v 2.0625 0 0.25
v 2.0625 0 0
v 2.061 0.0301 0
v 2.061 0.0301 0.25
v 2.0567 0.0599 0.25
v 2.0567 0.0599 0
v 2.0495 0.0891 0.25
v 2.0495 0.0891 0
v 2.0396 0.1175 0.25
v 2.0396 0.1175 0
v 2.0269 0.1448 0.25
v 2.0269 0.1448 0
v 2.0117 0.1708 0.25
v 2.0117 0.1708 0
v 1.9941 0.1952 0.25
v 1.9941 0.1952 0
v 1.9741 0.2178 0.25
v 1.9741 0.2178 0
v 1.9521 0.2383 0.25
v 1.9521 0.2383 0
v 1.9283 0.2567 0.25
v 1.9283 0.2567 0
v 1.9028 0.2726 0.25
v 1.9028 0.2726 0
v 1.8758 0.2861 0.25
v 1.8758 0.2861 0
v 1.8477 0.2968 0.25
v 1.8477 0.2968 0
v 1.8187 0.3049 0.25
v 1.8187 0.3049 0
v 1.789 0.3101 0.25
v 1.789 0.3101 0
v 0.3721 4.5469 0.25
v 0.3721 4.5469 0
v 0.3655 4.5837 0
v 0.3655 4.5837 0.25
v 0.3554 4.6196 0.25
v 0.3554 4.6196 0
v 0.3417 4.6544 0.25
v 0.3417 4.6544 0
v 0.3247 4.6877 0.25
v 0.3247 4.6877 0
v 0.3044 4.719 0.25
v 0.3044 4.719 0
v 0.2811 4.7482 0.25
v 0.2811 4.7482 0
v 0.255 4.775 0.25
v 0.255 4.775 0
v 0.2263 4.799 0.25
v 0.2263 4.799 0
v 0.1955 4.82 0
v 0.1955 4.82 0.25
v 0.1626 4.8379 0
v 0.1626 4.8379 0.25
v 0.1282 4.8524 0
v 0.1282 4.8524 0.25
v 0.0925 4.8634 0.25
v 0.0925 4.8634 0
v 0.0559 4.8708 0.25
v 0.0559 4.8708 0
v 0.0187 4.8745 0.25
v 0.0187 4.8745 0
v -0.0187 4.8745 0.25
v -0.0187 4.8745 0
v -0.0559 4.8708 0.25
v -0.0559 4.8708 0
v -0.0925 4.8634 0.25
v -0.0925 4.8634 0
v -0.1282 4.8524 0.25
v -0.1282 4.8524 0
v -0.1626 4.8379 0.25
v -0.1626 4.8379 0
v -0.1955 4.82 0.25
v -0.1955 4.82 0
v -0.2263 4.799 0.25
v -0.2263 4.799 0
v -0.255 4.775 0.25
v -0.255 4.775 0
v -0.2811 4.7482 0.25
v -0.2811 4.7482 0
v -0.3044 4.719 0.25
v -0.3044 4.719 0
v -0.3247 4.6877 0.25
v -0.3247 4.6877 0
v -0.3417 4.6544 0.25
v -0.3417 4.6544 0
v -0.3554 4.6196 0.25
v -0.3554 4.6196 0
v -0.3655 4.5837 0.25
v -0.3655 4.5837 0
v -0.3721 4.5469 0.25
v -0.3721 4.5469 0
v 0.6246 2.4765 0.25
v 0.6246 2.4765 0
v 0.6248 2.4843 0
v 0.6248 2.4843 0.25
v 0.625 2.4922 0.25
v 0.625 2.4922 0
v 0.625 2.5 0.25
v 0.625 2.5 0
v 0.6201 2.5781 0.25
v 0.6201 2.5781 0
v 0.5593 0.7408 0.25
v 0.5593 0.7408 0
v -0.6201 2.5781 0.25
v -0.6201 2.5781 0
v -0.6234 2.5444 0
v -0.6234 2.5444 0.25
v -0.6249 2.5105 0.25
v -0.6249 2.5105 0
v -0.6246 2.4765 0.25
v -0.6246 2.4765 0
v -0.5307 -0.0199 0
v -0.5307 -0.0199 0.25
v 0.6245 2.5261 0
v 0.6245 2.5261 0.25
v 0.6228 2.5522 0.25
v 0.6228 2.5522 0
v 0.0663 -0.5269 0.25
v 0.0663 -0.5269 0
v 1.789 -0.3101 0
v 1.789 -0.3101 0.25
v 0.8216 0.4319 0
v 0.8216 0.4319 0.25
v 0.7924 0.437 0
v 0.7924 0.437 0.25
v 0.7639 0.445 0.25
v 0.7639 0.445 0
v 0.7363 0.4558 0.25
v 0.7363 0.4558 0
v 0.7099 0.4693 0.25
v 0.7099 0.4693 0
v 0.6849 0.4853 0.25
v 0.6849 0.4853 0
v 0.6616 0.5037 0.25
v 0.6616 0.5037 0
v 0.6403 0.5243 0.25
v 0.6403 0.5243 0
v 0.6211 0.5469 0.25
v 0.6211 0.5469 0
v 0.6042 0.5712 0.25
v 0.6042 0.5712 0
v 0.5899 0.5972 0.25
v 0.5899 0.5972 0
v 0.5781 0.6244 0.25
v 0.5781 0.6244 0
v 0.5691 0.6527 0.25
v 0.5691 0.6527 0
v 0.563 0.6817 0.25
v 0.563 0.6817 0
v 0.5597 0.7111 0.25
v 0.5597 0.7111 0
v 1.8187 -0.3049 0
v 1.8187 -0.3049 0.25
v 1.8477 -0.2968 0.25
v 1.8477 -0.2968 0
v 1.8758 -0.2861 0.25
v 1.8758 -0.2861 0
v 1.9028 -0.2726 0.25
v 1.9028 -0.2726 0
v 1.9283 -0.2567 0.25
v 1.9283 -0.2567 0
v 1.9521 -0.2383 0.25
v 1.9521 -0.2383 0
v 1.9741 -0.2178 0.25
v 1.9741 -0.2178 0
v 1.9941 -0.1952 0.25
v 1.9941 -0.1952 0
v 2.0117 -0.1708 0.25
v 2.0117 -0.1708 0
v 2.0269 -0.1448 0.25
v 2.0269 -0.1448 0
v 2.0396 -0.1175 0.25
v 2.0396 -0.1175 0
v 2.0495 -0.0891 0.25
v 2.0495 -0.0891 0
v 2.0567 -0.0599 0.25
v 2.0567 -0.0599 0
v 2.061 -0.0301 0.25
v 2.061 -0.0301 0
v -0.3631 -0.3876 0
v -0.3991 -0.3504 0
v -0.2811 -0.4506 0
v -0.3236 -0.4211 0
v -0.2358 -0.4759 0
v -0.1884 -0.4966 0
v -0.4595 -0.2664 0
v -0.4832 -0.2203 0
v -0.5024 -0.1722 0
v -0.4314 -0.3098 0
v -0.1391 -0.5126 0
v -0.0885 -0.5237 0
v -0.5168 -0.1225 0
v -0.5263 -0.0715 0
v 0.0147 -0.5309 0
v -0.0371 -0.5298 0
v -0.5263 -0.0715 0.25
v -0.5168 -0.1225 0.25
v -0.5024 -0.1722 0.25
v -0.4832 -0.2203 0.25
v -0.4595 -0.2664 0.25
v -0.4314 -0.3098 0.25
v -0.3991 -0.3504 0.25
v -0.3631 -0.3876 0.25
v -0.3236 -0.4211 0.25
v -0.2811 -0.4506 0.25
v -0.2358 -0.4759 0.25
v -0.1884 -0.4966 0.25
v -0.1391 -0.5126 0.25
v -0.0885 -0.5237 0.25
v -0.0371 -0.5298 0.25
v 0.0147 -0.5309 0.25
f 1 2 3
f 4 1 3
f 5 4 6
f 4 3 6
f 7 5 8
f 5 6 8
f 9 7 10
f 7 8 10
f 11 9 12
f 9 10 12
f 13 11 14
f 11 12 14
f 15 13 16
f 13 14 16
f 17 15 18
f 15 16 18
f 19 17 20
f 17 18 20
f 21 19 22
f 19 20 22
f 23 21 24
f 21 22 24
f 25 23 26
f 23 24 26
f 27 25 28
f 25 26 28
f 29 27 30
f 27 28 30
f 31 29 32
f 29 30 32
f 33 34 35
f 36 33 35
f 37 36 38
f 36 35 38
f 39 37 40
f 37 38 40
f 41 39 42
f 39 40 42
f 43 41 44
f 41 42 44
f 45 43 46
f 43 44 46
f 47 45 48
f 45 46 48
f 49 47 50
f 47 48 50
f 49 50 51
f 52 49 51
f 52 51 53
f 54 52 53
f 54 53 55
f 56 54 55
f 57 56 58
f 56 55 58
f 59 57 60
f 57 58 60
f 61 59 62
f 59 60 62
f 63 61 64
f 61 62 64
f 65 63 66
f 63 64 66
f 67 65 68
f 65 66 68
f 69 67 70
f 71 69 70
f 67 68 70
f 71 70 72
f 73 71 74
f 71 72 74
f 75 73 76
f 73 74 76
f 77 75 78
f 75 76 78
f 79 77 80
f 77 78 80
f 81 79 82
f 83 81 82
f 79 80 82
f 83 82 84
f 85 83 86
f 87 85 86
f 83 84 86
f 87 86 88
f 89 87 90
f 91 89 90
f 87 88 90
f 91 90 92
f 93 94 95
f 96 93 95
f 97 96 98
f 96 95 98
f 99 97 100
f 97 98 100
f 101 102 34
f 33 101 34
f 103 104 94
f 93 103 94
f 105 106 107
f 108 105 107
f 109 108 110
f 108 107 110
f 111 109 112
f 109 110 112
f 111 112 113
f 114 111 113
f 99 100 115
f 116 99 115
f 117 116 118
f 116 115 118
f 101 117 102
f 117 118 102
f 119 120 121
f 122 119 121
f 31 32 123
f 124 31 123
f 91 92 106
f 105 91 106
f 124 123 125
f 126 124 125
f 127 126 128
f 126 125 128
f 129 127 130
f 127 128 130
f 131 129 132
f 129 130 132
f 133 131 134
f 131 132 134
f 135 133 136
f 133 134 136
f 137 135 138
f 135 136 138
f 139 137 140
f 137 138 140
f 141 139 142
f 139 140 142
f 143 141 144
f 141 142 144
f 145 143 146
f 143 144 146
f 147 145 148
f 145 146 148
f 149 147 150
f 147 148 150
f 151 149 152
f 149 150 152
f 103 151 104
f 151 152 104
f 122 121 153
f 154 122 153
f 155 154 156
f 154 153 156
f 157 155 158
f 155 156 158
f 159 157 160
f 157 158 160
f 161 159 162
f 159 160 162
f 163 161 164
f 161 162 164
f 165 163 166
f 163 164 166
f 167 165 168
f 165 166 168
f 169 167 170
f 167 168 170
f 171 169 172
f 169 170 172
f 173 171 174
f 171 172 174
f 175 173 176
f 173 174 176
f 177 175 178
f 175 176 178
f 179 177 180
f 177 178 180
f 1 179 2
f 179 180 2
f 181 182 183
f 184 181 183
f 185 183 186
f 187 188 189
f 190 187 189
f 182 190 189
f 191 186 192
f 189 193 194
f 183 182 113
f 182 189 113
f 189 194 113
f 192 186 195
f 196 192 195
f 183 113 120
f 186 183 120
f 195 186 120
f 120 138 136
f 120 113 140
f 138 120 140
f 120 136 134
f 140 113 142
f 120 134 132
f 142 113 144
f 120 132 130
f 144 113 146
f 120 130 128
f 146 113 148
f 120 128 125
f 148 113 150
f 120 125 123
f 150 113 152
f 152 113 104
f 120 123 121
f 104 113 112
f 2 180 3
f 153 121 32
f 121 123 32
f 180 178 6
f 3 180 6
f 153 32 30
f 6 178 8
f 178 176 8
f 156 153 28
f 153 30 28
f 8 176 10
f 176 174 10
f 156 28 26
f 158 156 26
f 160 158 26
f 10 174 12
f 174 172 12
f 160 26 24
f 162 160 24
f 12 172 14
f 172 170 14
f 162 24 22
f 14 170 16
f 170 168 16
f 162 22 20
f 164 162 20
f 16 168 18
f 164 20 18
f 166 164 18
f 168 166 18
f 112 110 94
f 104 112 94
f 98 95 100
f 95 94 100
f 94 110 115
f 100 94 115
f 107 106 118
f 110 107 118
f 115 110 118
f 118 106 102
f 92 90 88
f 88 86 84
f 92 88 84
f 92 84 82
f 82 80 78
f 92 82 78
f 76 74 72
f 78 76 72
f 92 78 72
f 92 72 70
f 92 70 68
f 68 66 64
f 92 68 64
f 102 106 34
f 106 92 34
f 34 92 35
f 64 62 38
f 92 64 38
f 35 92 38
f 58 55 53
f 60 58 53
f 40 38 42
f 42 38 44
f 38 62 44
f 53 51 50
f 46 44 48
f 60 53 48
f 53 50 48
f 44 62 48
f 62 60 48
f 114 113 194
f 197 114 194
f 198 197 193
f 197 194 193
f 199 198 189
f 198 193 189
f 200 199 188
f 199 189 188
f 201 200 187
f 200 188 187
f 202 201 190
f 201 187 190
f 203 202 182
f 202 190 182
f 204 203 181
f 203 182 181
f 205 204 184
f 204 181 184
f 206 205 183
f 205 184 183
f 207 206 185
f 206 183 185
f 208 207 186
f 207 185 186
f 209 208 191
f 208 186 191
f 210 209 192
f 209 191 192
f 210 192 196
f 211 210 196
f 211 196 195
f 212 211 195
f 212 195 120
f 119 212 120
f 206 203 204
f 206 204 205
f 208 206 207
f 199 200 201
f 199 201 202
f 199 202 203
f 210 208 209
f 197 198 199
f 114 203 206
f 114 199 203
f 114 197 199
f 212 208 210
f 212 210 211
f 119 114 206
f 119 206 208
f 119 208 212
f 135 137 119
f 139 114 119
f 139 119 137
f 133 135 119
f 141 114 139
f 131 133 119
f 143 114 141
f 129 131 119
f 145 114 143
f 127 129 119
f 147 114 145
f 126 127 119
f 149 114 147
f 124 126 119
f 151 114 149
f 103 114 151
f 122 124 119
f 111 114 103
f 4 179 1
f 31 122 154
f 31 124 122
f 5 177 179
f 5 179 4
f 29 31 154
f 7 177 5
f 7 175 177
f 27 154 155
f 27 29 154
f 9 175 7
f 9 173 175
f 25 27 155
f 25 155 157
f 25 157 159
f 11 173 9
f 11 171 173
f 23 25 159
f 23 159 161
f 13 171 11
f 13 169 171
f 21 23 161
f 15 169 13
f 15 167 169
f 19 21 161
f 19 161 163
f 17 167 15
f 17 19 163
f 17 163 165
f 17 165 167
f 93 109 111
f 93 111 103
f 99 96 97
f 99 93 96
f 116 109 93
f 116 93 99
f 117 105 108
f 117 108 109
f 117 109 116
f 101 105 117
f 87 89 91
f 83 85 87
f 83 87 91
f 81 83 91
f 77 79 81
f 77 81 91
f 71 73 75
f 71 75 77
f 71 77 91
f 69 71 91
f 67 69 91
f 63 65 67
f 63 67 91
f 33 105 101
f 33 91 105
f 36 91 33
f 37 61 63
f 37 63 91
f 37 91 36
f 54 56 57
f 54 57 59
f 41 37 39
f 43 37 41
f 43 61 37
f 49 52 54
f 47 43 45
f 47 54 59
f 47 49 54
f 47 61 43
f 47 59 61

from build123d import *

# Parameters (mm, degrees)
F1_DEPTH = 0.25


with BuildPart() as f1:
    # F0 (on Top) → F1 (new body)
    with BuildSketch(Plane.XY):
        with BuildLine():
            ThreePointArc((0.372059, 4.546875), (0, 4.875), (-0.372059, 4.546875))
            ThreePointArc((-0.372059, 4.546875), (-0.023484, 4.125736), (0.375, 4.5))
            ThreePointArc((0.375, 4.5), (0.374264, 4.523484), (0.372059, 4.546875))
        make_face()
        with BuildLine():
            Line((-0.372059, 4.546875), (-0.620098, 2.578125))
            ThreePointArc((-0.620098, 2.578125), (0, 3.125), (0.620098, 2.578125))
            Line((0.620098, 2.578125), (0.372059, 4.546875))
            ThreePointArc((0.372059, 4.546875), (0.374264, 4.523484), (0.375, 4.5))
            ThreePointArc((0.375, 4.5), (-0.023484, 4.125736), (-0.372059, 4.546875))
        make_face()
        with BuildLine():
            ThreePointArc((-0.620098, 2.578125), (-0.624398, 2.527417), (-0.624559, 2.476526))
            ThreePointArc((-0.624559, 2.476526), (0, 1.875), (0.624559, 2.476526))
            ThreePointArc((0.624559, 2.476526), (0.62489, 2.488261), (0.625, 2.5))
            ThreePointArc((0.625, 2.5), (0.623773, 2.539139), (0.620098, 2.578125))
            ThreePointArc((0.620098, 2.578125), (0, 3.125), (-0.620098, 2.578125))
        make_face()
        with BuildLine():
            ThreePointArc((-0.530731, -0.019947), (-0.009975, 0.531012), (0.531106, 0))
            ThreePointArc((0.531106, 0), (0.398315, -0.35131), (0.066345, -0.526946))
            Line((0.066345, -0.526946), (1.789037, -0.310052))
            ThreePointArc((1.789037, -0.310052), (1.4375, 0), (1.789037, 0.310052))
            Line((1.789037, 0.310052), (0.821635, 0.431852))
            ThreePointArc((0.821635, 0.431852), (0.630431, 0.535322), (0.559322, 0.740769))
            Line((0.559322, 0.740769), (0.624559, 2.476526))
            ThreePointArc((0.624559, 2.476526), (0, 1.875), (-0.624559, 2.476526))
            Line((-0.624559, 2.476526), (-0.530731, -0.019947))
        make_face()
        with BuildLine():
            ThreePointArc((0.066345, -0.526946), (0.398315, -0.35131), (0.531106, 0))
            ThreePointArc((0.531106, 0), (-0.009975, 0.531012), (-0.530731, -0.019947))
            ThreePointArc((-0.530731, -0.019947), (-0.343767, -0.404843), (0.066345, -0.526946))
        make_face()
        with BuildLine():
            ThreePointArc((1.789037, 0.310052), (1.4375, 0), (1.789037, -0.310052))
            ThreePointArc((1.789037, -0.310052), (1.984366, -0.206709), (2.0625, 0))
            ThreePointArc((2.0625, 0), (1.984366, 0.206709), (1.789037, 0.310052))
        make_face()
    extrude(amount=F1_DEPTH)


solid = f1.part
